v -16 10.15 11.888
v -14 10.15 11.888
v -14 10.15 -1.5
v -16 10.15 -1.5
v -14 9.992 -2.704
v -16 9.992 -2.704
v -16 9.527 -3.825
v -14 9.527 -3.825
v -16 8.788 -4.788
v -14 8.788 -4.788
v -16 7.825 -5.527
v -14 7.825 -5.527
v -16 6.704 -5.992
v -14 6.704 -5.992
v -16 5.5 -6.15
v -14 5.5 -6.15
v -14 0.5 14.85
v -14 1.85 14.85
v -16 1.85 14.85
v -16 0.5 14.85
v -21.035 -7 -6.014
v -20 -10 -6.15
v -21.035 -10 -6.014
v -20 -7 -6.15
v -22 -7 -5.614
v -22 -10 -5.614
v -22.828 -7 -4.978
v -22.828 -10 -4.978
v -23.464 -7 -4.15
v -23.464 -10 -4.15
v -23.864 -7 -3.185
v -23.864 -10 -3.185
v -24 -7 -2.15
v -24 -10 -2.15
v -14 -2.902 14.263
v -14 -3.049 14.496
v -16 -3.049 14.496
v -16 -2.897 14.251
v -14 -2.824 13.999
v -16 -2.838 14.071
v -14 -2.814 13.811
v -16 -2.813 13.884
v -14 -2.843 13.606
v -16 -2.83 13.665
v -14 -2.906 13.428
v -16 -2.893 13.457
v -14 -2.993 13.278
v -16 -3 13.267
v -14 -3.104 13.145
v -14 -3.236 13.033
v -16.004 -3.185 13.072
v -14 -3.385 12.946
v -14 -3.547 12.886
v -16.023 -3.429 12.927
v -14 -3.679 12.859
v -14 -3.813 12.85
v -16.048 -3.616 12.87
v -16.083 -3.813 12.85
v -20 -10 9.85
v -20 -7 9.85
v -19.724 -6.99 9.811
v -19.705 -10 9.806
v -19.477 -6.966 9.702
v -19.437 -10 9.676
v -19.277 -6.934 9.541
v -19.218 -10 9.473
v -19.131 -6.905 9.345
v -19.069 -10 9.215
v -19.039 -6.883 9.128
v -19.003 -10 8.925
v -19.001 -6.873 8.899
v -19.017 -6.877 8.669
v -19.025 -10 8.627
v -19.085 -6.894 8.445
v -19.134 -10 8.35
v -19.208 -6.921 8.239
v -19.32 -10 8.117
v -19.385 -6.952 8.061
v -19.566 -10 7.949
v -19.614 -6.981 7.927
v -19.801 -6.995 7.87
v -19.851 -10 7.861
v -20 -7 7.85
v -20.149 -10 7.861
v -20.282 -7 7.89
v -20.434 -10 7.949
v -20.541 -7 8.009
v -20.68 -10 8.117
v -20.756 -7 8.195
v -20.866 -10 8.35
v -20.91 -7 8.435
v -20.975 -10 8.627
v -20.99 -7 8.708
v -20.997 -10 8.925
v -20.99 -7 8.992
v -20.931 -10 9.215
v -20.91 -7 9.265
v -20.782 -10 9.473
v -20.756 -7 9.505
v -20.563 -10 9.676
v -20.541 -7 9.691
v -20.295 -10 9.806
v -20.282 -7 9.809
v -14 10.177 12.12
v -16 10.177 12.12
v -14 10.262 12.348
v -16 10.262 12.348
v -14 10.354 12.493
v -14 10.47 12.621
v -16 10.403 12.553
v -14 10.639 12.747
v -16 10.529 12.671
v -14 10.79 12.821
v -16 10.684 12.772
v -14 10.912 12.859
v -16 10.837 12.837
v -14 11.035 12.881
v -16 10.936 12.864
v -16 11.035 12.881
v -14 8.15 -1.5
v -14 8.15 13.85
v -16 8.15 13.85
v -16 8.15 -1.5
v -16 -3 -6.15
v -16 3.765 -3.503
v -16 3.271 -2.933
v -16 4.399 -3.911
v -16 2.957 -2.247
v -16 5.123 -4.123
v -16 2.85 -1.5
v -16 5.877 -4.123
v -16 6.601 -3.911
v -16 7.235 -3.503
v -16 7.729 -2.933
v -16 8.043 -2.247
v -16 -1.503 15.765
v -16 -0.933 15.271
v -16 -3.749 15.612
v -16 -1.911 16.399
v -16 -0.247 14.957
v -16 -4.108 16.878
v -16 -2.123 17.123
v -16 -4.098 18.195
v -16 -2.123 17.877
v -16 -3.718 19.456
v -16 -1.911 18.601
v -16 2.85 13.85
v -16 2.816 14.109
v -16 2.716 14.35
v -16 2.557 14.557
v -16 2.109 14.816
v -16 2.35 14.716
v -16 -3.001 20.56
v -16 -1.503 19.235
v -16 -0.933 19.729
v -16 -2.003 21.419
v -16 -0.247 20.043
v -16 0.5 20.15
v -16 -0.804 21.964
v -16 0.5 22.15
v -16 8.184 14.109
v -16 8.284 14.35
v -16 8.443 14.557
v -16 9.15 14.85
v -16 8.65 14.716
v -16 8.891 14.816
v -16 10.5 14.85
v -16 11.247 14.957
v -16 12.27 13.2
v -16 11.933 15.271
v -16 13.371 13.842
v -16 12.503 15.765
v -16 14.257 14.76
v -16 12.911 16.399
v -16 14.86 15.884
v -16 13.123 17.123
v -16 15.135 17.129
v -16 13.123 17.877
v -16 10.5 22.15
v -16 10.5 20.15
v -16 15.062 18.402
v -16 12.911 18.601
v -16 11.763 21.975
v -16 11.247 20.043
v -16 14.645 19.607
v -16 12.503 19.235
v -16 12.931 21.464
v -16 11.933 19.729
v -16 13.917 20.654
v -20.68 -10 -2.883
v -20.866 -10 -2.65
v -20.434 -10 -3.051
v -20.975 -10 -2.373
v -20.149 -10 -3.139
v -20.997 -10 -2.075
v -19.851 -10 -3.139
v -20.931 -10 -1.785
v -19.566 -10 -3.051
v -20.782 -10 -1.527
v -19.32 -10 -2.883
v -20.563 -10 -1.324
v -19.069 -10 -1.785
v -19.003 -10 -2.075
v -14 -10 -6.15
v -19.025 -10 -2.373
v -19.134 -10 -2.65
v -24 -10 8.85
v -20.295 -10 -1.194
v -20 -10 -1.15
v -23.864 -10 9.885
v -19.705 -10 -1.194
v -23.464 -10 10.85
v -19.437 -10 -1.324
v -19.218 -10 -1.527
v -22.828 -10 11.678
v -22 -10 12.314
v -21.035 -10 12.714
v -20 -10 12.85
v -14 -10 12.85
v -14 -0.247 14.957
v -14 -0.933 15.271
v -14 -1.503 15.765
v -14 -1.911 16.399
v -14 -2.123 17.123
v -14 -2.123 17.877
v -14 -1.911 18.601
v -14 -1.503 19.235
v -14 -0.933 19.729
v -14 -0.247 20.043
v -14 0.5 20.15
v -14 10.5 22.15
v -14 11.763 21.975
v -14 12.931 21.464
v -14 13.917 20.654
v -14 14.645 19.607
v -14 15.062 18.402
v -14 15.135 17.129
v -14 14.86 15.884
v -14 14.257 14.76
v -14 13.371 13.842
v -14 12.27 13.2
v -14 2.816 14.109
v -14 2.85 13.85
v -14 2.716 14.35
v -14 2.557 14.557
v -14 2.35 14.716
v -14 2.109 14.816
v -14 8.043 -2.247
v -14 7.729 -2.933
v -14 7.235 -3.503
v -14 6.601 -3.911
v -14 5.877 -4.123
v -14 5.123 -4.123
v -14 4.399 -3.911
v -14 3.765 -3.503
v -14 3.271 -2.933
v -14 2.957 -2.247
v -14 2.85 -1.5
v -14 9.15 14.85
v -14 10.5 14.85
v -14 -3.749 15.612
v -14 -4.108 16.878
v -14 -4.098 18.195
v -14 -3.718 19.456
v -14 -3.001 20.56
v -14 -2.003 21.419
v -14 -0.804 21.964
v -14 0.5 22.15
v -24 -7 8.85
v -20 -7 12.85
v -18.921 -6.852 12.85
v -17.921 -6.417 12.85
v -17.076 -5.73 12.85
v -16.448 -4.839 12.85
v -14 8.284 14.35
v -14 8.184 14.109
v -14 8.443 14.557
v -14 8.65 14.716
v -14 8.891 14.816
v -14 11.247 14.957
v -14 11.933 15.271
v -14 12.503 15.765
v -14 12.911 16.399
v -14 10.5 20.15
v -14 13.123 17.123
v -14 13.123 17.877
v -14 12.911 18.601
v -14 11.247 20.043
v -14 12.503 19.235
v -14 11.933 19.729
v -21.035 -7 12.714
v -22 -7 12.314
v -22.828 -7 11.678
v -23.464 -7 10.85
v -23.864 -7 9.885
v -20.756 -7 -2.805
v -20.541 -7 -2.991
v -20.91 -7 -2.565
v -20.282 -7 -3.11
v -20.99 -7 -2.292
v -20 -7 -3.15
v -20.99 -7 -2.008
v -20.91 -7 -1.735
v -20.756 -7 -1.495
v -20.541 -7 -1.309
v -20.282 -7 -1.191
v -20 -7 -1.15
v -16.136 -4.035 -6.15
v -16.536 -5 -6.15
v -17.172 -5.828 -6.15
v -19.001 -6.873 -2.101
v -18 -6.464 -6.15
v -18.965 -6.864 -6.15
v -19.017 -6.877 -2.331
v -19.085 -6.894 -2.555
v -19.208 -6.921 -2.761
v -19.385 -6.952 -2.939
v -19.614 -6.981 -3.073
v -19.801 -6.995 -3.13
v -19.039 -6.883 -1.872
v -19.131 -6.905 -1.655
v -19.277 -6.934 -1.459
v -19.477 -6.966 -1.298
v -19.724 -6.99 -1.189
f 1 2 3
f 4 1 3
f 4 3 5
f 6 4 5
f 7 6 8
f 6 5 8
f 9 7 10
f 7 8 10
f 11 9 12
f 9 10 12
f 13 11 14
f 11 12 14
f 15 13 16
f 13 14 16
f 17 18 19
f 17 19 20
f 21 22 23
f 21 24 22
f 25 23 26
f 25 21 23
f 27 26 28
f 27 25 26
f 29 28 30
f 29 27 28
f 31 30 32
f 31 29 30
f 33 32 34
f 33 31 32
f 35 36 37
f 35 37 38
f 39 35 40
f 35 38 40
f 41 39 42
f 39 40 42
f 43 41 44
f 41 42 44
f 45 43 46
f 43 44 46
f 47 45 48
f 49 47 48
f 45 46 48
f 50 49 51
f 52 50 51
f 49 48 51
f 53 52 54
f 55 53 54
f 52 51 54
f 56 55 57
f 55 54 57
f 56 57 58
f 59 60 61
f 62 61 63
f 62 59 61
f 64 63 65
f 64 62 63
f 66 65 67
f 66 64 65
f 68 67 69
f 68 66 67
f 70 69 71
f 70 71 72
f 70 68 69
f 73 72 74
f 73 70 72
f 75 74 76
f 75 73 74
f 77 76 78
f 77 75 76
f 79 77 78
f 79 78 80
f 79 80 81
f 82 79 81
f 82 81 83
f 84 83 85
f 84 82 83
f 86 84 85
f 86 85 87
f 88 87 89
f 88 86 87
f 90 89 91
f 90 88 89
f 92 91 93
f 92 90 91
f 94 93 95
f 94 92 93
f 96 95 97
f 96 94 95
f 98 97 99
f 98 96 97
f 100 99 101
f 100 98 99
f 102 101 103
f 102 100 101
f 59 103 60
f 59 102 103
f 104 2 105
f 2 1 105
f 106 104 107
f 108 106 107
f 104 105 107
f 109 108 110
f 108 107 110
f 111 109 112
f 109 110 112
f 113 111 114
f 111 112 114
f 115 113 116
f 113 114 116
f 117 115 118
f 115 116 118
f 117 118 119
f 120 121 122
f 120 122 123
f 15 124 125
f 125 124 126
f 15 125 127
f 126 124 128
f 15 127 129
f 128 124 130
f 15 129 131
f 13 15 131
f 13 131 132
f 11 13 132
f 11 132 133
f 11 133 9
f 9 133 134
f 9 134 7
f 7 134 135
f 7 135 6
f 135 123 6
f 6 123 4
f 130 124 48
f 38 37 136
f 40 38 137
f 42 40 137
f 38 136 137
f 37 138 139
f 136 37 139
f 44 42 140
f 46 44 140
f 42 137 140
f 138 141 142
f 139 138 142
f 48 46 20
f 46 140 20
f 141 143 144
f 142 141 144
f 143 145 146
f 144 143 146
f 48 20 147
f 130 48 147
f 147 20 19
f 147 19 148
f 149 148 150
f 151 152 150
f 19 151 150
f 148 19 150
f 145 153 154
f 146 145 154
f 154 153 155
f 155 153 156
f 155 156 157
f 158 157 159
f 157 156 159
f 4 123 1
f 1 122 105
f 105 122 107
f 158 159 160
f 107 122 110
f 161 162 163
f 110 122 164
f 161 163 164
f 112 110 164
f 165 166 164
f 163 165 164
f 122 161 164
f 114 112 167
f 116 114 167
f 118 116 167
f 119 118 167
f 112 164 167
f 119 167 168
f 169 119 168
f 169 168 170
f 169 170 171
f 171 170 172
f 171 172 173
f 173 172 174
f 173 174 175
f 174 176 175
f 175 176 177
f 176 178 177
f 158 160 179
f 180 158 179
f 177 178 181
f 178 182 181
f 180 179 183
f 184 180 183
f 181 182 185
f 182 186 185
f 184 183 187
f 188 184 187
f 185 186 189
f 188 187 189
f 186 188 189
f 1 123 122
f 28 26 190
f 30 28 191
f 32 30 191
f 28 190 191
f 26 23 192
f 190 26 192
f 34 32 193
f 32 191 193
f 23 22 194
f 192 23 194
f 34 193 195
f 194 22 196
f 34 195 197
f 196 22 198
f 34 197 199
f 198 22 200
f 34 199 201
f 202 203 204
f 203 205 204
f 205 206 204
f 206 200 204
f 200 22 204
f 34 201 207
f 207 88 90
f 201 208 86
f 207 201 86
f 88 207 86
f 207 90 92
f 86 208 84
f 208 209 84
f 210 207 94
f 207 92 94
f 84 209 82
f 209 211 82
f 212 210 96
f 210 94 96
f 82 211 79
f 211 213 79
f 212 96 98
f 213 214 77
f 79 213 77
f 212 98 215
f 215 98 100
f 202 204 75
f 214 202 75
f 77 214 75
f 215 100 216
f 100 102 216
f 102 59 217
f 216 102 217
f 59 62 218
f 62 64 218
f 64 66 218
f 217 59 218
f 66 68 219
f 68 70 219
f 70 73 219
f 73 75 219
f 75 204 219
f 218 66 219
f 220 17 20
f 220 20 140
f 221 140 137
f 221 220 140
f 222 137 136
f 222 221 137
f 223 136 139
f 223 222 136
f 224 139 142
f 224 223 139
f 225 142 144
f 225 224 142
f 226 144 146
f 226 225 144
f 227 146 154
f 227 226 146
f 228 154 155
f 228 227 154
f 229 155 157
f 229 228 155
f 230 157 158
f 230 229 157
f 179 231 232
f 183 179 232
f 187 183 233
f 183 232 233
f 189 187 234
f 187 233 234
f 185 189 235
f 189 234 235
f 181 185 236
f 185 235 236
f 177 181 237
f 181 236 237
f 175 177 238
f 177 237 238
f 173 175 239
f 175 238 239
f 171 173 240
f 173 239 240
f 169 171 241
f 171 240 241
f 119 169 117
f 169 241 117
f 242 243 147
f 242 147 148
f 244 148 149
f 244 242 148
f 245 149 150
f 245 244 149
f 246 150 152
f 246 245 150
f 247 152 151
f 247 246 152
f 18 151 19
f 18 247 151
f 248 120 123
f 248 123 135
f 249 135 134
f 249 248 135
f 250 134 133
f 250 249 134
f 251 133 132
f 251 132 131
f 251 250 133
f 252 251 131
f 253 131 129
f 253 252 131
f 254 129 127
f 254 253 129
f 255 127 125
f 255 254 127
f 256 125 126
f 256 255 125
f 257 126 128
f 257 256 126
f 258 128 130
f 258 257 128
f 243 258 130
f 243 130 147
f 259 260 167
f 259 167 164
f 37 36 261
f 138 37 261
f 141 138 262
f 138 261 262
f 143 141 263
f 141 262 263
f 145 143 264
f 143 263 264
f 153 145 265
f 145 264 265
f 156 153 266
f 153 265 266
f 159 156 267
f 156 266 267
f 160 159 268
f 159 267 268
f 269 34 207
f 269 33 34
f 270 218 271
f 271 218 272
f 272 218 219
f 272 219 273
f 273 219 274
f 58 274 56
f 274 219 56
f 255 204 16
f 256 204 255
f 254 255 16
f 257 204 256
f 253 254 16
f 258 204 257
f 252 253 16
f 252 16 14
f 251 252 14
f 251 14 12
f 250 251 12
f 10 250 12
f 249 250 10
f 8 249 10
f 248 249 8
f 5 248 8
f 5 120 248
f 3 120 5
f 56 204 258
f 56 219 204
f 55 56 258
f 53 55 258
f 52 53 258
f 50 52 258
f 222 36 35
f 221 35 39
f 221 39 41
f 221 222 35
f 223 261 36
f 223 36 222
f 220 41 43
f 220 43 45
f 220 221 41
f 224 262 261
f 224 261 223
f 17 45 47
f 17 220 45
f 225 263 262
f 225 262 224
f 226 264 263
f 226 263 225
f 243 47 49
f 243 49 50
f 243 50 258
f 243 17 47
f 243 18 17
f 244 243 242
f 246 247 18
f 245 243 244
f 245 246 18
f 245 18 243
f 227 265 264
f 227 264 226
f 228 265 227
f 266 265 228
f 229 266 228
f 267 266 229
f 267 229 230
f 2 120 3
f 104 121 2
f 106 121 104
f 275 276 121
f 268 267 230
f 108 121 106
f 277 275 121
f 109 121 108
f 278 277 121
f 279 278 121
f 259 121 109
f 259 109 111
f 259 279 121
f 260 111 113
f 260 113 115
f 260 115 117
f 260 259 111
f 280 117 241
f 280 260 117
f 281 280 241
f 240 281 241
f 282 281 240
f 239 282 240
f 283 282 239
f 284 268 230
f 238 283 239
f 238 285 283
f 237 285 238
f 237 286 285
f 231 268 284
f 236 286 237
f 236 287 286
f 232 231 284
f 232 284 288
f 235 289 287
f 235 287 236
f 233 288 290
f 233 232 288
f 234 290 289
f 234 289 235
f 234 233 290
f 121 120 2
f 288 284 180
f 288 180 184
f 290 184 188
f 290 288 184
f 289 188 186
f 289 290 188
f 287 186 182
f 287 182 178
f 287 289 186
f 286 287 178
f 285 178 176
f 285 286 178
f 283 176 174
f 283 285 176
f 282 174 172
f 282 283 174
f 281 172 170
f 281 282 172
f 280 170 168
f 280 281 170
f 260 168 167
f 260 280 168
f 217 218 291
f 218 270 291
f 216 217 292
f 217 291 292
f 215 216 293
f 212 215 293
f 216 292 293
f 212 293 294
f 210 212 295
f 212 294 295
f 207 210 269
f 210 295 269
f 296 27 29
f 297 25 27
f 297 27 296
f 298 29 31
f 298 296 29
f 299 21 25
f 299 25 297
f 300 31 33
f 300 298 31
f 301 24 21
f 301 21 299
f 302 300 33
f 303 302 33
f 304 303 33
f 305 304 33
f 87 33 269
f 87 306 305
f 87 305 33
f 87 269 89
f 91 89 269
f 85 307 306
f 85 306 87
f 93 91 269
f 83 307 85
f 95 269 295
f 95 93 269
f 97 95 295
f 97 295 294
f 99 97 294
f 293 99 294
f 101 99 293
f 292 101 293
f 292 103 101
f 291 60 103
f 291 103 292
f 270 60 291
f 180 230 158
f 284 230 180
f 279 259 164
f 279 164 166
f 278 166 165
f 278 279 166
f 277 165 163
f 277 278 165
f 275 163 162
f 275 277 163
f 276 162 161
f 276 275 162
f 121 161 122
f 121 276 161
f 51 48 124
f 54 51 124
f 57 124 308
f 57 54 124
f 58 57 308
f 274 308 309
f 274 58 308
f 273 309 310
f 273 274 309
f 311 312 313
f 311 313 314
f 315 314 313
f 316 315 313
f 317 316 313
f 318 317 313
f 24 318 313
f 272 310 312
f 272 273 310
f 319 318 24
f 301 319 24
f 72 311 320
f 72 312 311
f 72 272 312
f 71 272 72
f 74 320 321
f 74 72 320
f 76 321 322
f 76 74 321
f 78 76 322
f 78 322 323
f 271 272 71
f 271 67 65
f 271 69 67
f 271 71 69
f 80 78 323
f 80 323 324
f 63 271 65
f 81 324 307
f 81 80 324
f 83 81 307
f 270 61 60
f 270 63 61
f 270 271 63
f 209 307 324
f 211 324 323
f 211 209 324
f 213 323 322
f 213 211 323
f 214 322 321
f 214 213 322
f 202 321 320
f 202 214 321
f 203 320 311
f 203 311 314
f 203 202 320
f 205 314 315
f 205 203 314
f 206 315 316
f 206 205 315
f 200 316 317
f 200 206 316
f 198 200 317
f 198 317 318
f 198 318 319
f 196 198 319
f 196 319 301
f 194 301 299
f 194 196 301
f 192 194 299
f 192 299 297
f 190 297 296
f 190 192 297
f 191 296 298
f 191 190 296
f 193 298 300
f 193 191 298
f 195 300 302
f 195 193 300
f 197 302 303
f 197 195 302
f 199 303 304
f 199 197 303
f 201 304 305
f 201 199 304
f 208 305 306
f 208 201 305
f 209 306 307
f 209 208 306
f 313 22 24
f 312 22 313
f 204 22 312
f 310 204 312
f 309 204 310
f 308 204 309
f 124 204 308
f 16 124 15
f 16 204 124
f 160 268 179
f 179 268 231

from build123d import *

# Parameters (mm, degrees)
BOSS_EXTRUDE1_DEPTH = 2
BOSS_EXTRUDE2_START = -16
BOSS_EXTRUDE2_DEPTH = 2
SKETCH3_W           = 19
SKETCH3_H           = 3
BOSS_EXTRUDE3_DEPTH = 8
FILLET1_R           = 4
SKETCH5_W           = 1
SKETCH5_H           = 3
HOLE1_AT_2_COUNT    = 2
HOLE1_AT_2_PITCH    = 11
CUT_EXTRUDE1_START  = 2
SKETCH6_R           = 1
CUT_EXTRUDE1_DEPTH  = 2
FILLET2_R           = 1


# Read off the part's stored shape, not the designer's step: Boss-Extrude2
with BuildPart() as part:
    # Sketch1 → Boss-Extrude1 (new body)
    with BuildSketch(Plane.ZY.offset(14)):
        with BuildLine():
            Line((12.85, 10.15), (-1.5, 10.15))
            ThreePointArc((-1.5, 10.15), (-6.15, 5.5), (-1.5, 0.85))
            Line((-1.5, 0.85), (12.85, 0.85))
            Line((12.85, 0.85), (12.85, 0.5))
            ThreePointArc((12.85, 0.5), (17.5, -4.15), (22.15, 0.5))
            Line((22.15, 0.5), (22.15, 10.5))
            ThreePointArc((22.15, 10.5), (17.5, 15.15), (12.85, 10.5))
            Line((12.85, 10.5), (12.85, 10.15))
        make_face()
        with BuildLine():
            Line((13.85, 8.15), (-1.5, 8.15))
            ThreePointArc((-1.5, 8.15), (-4.15, 5.5), (-1.5, 2.85))
            Line((-1.5, 2.85), (13.85, 2.85))
            ThreePointArc((13.85, 2.85), (14.557106781, 2.557106781), (14.85, 1.85))
            Line((14.85, 1.85), (14.85, 0.5))
            ThreePointArc((14.85, 0.5), (17.5, -2.15), (20.15, 0.5))
            Line((20.15, 0.5), (20.15, 10.5))
            ThreePointArc((20.15, 10.5), (17.5, 13.15), (14.85, 10.5))
            Line((14.85, 10.5), (14.85, 9.15))
            ThreePointArc((14.85, 9.15), (14.557106781, 8.442893219), (13.85, 8.15))
        make_face(mode=Mode.SUBTRACT)
    extrude(amount=BOSS_EXTRUDE1_DEPTH)

    # Boss-Extrude2 outline → Boss-Extrude2 (add)
    with BuildSketch(Plane.YZ.offset(BOSS_EXTRUDE2_START)):
        with BuildLine():
            Line((-10, 12.85), (-10, -6.15))
            Line((-10, -6.15), (5.5, -6.15))
            ThreePointArc((5.5, -6.15), (2.211953467, -4.788046533), (0.85, -1.5))
            Line((0.85, -1.5), (0.85, 12.85))
            Line((0.85, 12.85), (-10, 12.85))
        make_face()
    extrude(amount=BOSS_EXTRUDE2_DEPTH)

    # Sketch3 → Boss-Extrude3 (add)
    with BuildSketch(Plane.ZY.offset(16)):
        with Locations((3.35, -8.5)):
            Rectangle(SKETCH3_W, SKETCH3_H)
    extrude(amount=BOSS_EXTRUDE3_DEPTH)

    # Fillet1
    fillet1_edges = [part.edges().sort_by_distance(p)[0] for p in [
        (-24, -8.5, 12.85),
        (-24, -8.5, -6.15),
        (-16, -7, 3.35),
    ]]
    fillet(fillet1_edges, radius=FILLET1_R - 0.0001)  # a hair under: the kernel refuses the full size

    # Sketch5 → Hole1 (revolve, cut)
    with BuildSketch(Plane(origin=(-20, -7, -2.15), x_dir=(0, 0, 1), z_dir=(1, 0, 0))):
        with Locations((0.5, 1.5)):
            Rectangle(SKETCH5_W, SKETCH5_H)
    hole1 = revolve(axis=Axis((-20, -117, -2.15), (0, 1, 0)), mode=Mode.SUBTRACT)

    # Hole1 at 2: Hole1 ×2
    with Locations(*[(0, 0, i * HOLE1_AT_2_PITCH) for i in range(1, HOLE1_AT_2_COUNT)]):
        add(hole1, mode=Mode.SUBTRACT)

    # Sketch6 → Cut-Extrude1 (cut)
    with BuildSketch(Plane(origin=(0, -7, 0), x_dir=(1, 0, 0), z_dir=(0, 1, 0)).offset(CUT_EXTRUDE1_START)):
        with Locations(Location((-20, -8.85, 0), (0, 0, 270))):
            Circle(SKETCH6_R)
        with Locations(Location((-20, 2.15, 0), (0, 0, 270))):
            Circle(SKETCH6_R)
    extrude(amount=-CUT_EXTRUDE1_DEPTH, mode=Mode.SUBTRACT)

    # Fillet2
    fillet2_edges = [part.edges().sort_by_distance(p)[0] for p in [
        (-15, 10.15, 12.85),
    ]]
    fillet(fillet2_edges, radius=FILLET2_R)
    fillet2_2_edges = [part.edges().sort_by_distance(p)[0] for p in [
        (-15, 0.5, 12.85),
    ]]
    fillet(fillet2_2_edges, radius=FILLET2_R)


solid = part.part
